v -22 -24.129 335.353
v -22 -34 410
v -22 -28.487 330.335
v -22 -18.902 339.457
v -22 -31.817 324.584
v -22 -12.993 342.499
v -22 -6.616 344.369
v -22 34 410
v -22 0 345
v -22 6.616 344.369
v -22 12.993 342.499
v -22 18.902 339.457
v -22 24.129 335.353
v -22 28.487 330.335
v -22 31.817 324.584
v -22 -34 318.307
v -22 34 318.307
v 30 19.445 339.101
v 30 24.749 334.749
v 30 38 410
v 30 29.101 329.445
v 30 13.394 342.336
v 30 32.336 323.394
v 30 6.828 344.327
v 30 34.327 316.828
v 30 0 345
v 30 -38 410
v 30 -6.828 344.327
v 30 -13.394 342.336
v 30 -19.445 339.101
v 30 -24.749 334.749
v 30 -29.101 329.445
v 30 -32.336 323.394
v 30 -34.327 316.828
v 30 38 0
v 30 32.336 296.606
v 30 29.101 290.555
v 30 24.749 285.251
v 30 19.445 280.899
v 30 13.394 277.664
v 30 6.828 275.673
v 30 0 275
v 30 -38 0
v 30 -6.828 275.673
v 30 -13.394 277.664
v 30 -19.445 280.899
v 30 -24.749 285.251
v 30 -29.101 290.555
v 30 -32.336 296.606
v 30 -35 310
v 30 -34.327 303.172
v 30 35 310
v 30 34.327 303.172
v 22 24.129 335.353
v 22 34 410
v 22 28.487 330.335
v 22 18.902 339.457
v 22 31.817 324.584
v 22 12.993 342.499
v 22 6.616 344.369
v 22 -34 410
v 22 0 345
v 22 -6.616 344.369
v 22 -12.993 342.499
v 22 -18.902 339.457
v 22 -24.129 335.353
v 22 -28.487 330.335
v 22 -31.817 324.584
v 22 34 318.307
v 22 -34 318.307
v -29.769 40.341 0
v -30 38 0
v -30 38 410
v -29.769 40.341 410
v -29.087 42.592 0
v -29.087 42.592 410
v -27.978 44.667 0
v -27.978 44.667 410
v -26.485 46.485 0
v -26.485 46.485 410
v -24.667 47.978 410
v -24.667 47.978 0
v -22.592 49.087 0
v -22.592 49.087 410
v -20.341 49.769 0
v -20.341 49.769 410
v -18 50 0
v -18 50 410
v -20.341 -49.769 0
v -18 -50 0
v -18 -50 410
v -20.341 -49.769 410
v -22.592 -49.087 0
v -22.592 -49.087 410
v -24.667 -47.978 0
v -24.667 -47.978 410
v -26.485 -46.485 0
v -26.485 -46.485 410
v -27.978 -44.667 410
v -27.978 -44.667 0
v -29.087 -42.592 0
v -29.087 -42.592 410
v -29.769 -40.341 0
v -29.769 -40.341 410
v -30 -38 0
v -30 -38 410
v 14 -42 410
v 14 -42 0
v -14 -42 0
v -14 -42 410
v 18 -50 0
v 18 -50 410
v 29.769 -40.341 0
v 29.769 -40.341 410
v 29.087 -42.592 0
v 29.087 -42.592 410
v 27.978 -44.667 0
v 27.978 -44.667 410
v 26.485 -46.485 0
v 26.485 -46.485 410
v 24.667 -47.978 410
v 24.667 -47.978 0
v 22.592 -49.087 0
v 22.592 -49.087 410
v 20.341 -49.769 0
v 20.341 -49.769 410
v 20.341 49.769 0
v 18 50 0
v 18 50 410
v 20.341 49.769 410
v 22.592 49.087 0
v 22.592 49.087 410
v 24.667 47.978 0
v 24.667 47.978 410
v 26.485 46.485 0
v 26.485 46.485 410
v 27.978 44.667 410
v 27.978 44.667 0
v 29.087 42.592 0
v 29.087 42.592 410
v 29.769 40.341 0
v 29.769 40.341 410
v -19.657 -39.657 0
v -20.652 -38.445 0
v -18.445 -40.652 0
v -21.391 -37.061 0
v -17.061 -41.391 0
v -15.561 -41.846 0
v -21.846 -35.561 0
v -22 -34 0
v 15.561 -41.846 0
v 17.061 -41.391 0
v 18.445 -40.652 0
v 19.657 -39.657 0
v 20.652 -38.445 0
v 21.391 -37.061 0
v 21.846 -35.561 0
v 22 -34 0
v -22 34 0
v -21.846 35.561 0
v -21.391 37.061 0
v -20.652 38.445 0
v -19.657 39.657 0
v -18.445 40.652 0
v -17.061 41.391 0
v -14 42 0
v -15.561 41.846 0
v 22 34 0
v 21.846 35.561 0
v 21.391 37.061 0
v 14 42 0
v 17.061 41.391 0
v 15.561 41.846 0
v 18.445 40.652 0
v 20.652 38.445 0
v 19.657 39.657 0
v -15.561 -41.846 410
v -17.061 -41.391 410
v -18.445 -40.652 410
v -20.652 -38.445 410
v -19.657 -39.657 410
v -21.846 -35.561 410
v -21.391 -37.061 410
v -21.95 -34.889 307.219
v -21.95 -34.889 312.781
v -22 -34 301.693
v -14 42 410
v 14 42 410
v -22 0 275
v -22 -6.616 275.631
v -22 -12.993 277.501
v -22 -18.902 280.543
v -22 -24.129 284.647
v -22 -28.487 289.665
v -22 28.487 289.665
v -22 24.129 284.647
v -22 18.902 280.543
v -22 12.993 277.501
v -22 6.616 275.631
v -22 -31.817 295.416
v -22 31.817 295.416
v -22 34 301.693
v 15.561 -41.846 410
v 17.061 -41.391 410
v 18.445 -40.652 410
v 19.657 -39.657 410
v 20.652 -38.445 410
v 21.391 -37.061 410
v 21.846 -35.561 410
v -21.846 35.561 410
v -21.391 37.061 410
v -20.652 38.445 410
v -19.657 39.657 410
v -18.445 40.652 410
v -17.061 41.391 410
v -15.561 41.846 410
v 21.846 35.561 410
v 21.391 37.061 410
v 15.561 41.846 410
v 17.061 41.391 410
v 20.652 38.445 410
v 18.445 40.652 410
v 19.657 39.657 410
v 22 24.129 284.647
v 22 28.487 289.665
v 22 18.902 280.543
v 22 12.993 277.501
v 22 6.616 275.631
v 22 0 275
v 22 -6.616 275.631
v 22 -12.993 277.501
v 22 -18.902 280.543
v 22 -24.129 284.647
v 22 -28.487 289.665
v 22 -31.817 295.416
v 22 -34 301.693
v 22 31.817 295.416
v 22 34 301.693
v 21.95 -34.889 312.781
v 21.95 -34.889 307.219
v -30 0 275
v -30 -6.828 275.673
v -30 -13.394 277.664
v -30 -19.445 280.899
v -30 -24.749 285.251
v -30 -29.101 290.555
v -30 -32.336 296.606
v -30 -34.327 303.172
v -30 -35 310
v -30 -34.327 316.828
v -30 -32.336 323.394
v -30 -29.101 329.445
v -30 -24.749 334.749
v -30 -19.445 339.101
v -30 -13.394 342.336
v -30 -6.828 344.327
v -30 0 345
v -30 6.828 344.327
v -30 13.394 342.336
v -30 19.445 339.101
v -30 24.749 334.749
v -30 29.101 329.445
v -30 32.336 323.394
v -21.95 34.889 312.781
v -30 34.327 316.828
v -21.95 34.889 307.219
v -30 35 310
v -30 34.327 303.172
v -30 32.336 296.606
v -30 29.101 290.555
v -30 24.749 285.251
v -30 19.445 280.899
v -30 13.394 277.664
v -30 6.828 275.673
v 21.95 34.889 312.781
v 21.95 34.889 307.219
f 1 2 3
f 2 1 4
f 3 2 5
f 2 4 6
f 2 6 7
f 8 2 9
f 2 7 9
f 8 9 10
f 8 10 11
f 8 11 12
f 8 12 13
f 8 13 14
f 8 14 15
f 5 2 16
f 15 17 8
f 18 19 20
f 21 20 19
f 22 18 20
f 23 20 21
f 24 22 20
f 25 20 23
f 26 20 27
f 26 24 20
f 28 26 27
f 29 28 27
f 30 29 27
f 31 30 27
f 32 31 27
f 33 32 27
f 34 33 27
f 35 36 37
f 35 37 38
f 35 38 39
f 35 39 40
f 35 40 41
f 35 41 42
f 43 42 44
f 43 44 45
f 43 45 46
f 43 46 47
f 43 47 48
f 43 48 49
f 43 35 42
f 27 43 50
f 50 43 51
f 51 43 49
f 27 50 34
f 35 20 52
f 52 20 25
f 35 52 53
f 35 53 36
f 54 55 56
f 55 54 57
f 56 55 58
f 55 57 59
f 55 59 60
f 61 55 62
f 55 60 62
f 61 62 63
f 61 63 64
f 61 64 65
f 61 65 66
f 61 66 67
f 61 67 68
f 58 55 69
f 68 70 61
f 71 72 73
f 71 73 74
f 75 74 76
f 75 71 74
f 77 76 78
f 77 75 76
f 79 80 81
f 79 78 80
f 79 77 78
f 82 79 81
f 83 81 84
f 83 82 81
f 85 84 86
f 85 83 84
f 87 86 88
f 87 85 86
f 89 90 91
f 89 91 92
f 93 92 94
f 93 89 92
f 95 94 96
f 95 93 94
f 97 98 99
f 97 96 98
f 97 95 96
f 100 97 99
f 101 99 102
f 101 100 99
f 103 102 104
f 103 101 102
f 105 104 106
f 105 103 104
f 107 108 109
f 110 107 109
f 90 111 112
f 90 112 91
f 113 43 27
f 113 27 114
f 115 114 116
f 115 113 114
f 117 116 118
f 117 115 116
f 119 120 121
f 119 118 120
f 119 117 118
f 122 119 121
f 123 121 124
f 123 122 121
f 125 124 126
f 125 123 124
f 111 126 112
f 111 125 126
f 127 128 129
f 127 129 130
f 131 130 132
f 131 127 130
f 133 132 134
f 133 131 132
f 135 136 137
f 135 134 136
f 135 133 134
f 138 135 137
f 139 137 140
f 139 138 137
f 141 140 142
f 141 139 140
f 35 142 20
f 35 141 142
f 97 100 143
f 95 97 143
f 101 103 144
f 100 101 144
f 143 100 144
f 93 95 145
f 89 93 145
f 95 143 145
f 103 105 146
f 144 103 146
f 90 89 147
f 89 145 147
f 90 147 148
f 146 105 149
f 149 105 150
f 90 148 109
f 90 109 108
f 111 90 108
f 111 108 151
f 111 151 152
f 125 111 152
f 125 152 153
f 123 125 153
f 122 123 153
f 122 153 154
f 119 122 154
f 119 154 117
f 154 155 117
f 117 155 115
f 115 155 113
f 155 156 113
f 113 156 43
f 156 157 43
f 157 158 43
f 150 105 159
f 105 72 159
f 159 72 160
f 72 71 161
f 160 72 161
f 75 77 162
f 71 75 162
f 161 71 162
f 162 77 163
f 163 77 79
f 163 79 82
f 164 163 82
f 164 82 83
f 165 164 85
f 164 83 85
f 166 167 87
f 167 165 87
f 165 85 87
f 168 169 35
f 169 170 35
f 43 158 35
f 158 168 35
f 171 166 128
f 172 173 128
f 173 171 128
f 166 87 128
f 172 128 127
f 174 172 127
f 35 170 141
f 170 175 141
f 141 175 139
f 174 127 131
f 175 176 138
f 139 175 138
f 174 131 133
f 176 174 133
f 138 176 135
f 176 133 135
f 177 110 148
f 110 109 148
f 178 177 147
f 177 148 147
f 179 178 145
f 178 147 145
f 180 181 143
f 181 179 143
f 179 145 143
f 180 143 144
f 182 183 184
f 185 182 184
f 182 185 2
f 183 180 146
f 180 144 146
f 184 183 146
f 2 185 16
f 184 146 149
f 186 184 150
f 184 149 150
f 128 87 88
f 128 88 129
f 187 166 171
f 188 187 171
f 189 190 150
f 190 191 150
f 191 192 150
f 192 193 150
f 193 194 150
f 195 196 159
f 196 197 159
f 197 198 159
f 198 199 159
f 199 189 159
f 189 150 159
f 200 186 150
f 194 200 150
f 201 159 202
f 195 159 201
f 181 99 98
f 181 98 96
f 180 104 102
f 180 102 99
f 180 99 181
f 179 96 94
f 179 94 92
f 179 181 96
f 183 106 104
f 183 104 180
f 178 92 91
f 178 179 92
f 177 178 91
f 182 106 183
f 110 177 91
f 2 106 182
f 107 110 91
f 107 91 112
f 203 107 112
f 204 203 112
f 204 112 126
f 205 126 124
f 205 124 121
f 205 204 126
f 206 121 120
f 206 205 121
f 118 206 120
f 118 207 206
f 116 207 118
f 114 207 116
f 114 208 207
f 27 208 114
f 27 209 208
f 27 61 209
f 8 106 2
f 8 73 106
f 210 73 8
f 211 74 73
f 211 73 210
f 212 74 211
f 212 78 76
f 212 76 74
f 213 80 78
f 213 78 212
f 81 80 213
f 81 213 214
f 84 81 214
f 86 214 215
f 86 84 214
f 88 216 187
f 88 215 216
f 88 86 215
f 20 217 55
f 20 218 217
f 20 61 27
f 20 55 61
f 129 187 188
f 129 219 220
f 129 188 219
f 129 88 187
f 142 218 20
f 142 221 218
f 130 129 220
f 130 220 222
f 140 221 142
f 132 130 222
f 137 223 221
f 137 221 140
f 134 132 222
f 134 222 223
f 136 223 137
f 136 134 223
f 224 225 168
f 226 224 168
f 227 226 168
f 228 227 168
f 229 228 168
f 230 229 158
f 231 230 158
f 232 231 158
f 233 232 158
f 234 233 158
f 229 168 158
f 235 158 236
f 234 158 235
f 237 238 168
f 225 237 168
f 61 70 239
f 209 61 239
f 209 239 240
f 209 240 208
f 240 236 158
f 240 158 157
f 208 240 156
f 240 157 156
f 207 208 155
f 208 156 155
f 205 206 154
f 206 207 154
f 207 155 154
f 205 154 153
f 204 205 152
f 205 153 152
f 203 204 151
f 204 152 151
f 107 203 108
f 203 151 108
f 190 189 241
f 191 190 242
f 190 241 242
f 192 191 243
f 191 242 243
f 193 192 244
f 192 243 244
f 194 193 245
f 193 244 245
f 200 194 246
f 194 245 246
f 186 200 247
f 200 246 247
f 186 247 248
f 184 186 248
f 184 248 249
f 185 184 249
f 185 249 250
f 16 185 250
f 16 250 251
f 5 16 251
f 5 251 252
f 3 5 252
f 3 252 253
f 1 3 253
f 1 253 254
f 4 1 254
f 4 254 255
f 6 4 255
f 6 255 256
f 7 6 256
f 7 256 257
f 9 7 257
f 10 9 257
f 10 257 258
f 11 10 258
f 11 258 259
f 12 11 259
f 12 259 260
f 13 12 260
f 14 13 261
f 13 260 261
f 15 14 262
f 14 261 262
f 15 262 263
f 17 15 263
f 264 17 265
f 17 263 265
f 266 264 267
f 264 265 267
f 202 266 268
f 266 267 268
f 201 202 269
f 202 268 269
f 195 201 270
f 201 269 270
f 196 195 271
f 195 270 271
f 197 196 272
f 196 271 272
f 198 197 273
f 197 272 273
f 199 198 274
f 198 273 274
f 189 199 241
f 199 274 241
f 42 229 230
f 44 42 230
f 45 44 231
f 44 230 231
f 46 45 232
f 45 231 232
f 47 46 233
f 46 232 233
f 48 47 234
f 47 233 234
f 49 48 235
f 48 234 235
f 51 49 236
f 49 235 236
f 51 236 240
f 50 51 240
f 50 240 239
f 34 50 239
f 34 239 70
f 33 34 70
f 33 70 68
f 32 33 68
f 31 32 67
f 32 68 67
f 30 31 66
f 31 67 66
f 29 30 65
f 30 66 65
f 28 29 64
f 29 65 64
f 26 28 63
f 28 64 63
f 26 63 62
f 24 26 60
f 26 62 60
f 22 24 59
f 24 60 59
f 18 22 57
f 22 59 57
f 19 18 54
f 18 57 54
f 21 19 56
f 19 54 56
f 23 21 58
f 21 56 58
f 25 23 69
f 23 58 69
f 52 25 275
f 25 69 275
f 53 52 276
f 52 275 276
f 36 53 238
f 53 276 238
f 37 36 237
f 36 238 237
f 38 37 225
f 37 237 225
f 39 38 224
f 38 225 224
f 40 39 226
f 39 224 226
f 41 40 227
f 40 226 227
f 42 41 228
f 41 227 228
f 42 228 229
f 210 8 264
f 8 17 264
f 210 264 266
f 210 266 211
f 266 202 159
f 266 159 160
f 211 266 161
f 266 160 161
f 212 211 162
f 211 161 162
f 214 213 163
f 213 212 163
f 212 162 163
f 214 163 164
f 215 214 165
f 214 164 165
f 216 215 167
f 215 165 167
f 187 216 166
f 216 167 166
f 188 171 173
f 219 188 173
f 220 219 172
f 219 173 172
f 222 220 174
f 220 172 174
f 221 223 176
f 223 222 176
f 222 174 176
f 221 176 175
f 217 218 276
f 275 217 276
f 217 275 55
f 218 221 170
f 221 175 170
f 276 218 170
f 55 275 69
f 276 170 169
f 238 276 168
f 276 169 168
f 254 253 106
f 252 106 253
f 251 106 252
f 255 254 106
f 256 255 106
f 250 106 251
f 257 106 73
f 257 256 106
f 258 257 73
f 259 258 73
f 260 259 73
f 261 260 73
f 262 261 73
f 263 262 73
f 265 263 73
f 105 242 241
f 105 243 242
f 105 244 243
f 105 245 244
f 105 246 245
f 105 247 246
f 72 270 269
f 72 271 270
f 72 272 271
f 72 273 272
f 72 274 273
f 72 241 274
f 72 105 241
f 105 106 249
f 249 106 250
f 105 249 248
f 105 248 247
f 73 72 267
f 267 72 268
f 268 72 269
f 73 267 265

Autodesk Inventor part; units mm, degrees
ref_plane "YZ Plane" through (0, 0, 0) normal (1, 0, 0) x (0, 1, 0)
ref_plane "Startebene" through (0, 0, 0) normal (0, 0, 1) x (1, 0, 0)
ref_plane "Endebene" through (0, 0, 410) normal (0, 0, 1) x (1, 0, 0)
sketch "Skizze" plane through (0, 0, 0) normal (0, 0, 1) x (1, 0, 0)
  line L0 (-30, -38) -> (-30, 38)
  line L1 (-18, 50) -> (18, 50)
  line L2 (30, 38) -> (30, -38)
  line L3 (18, -50) -> (-18, -50)
  arc A0 (-30, -38) -> (-18, -50) centre (-18, -38) ccw
  arc A1 (-18, 50) -> (-30, 38) centre (-18, 38) ccw
  arc A2 (30, 38) -> (18, 50) centre (18, 38) ccw
  arc A3 (18, -50) -> (30, -38) centre (18, -38) ccw
  line L4 (-14, 42) -> (14, 42)
  line L5 (22, 34) -> (22, -34)
  line L6 (14, -42) -> (-14, -42)
  line L7 (-22, -34) -> (-22, 34)
  line L8 (0, 73.4794) -> (0, -73.4794) construction
  line L9 (-45.4794, 0) -> (45.4794, 0) construction
  arc A4 (-22, -34) -> (-14, -42) centre (-14, -34) ccw
  arc A5 (-14, 42) -> (-22, 34) centre (-14, 34) ccw
  arc A6 (22, 34) -> (14, 42) centre (14, 34) ccw
  arc A7 (14, -42) -> (22, -34) centre (14, -34) ccw
  dimension "d7" = 12
  dimension "d10" = 100
  dimension "d11" = 60
  dimension "d12" = 8
  dimension "d15" = 50
  dimension "d16" = 30
  dimension "d19" = 8
  dimension "d20" = 8
extrude "Körper" add sketch "Skizze" along normal up to surface (410 mm away) from surface at 0
sketch "Sketch3" plane through (0, 0, 0) normal (0, 0, 1) x (1, 0, 0)
  line L0 (0, 0) -> (10, 0)
ref_plane "Work Plane3" through (0, 0, 0) normal (0, -1, 0) x (1, 0, 0)
sketch "Sketch4" plane through (0, 0, 0) normal (0, -1, 0) x (1, 0, 0)
  line L0 (-2, 0) -> (12, 0)
  line L1 (-2, 410) -> (12, 410)
  dimension "d18" = 410
sketch "Skizze5" plane through (30, -38, 410) normal (1, 0, 0) x (0, 0, -1)
  line L0 (410, -12) -> (0, -12) projected
  line L1 (0, 76) -> (0, 0) projected
  point P0 (410, 38)
  point P1 (100, 38)
  dimension "d21" = 50
  dimension "d30" = 100
hole "Bohrung1" at (30, 0, 310) direction (-1, 0, 0) diameter 70 end through all
equation "\"d7\" = G_IR"
equation "\"d10\" = G_H"
equation "\"d11\" = G_W"
equation "\"d12\" = G_T"
equation "\"d15\" = 0.5 * d10"
equation "\"d16\" = 0.5 * d11"
equation "\"d19\" = G_T"
equation "\"d20\" = G_T"
equation "\"d3\" = G_L"
equation "\"G_W\" = 60"
equation "\"G_H\" = 100"
equation "\"G_T\" = 8"
equation "\"G_IR\" = 12"
equation "\"G_L\" = d18"
equation "\"G_OFFSET_START\" = 0"
equation "\"G_OFFSET_END\" = 0"
properties part number "EN 10210-2 - 90 x 50 x 5 - 400" material "Stahl, weich"
